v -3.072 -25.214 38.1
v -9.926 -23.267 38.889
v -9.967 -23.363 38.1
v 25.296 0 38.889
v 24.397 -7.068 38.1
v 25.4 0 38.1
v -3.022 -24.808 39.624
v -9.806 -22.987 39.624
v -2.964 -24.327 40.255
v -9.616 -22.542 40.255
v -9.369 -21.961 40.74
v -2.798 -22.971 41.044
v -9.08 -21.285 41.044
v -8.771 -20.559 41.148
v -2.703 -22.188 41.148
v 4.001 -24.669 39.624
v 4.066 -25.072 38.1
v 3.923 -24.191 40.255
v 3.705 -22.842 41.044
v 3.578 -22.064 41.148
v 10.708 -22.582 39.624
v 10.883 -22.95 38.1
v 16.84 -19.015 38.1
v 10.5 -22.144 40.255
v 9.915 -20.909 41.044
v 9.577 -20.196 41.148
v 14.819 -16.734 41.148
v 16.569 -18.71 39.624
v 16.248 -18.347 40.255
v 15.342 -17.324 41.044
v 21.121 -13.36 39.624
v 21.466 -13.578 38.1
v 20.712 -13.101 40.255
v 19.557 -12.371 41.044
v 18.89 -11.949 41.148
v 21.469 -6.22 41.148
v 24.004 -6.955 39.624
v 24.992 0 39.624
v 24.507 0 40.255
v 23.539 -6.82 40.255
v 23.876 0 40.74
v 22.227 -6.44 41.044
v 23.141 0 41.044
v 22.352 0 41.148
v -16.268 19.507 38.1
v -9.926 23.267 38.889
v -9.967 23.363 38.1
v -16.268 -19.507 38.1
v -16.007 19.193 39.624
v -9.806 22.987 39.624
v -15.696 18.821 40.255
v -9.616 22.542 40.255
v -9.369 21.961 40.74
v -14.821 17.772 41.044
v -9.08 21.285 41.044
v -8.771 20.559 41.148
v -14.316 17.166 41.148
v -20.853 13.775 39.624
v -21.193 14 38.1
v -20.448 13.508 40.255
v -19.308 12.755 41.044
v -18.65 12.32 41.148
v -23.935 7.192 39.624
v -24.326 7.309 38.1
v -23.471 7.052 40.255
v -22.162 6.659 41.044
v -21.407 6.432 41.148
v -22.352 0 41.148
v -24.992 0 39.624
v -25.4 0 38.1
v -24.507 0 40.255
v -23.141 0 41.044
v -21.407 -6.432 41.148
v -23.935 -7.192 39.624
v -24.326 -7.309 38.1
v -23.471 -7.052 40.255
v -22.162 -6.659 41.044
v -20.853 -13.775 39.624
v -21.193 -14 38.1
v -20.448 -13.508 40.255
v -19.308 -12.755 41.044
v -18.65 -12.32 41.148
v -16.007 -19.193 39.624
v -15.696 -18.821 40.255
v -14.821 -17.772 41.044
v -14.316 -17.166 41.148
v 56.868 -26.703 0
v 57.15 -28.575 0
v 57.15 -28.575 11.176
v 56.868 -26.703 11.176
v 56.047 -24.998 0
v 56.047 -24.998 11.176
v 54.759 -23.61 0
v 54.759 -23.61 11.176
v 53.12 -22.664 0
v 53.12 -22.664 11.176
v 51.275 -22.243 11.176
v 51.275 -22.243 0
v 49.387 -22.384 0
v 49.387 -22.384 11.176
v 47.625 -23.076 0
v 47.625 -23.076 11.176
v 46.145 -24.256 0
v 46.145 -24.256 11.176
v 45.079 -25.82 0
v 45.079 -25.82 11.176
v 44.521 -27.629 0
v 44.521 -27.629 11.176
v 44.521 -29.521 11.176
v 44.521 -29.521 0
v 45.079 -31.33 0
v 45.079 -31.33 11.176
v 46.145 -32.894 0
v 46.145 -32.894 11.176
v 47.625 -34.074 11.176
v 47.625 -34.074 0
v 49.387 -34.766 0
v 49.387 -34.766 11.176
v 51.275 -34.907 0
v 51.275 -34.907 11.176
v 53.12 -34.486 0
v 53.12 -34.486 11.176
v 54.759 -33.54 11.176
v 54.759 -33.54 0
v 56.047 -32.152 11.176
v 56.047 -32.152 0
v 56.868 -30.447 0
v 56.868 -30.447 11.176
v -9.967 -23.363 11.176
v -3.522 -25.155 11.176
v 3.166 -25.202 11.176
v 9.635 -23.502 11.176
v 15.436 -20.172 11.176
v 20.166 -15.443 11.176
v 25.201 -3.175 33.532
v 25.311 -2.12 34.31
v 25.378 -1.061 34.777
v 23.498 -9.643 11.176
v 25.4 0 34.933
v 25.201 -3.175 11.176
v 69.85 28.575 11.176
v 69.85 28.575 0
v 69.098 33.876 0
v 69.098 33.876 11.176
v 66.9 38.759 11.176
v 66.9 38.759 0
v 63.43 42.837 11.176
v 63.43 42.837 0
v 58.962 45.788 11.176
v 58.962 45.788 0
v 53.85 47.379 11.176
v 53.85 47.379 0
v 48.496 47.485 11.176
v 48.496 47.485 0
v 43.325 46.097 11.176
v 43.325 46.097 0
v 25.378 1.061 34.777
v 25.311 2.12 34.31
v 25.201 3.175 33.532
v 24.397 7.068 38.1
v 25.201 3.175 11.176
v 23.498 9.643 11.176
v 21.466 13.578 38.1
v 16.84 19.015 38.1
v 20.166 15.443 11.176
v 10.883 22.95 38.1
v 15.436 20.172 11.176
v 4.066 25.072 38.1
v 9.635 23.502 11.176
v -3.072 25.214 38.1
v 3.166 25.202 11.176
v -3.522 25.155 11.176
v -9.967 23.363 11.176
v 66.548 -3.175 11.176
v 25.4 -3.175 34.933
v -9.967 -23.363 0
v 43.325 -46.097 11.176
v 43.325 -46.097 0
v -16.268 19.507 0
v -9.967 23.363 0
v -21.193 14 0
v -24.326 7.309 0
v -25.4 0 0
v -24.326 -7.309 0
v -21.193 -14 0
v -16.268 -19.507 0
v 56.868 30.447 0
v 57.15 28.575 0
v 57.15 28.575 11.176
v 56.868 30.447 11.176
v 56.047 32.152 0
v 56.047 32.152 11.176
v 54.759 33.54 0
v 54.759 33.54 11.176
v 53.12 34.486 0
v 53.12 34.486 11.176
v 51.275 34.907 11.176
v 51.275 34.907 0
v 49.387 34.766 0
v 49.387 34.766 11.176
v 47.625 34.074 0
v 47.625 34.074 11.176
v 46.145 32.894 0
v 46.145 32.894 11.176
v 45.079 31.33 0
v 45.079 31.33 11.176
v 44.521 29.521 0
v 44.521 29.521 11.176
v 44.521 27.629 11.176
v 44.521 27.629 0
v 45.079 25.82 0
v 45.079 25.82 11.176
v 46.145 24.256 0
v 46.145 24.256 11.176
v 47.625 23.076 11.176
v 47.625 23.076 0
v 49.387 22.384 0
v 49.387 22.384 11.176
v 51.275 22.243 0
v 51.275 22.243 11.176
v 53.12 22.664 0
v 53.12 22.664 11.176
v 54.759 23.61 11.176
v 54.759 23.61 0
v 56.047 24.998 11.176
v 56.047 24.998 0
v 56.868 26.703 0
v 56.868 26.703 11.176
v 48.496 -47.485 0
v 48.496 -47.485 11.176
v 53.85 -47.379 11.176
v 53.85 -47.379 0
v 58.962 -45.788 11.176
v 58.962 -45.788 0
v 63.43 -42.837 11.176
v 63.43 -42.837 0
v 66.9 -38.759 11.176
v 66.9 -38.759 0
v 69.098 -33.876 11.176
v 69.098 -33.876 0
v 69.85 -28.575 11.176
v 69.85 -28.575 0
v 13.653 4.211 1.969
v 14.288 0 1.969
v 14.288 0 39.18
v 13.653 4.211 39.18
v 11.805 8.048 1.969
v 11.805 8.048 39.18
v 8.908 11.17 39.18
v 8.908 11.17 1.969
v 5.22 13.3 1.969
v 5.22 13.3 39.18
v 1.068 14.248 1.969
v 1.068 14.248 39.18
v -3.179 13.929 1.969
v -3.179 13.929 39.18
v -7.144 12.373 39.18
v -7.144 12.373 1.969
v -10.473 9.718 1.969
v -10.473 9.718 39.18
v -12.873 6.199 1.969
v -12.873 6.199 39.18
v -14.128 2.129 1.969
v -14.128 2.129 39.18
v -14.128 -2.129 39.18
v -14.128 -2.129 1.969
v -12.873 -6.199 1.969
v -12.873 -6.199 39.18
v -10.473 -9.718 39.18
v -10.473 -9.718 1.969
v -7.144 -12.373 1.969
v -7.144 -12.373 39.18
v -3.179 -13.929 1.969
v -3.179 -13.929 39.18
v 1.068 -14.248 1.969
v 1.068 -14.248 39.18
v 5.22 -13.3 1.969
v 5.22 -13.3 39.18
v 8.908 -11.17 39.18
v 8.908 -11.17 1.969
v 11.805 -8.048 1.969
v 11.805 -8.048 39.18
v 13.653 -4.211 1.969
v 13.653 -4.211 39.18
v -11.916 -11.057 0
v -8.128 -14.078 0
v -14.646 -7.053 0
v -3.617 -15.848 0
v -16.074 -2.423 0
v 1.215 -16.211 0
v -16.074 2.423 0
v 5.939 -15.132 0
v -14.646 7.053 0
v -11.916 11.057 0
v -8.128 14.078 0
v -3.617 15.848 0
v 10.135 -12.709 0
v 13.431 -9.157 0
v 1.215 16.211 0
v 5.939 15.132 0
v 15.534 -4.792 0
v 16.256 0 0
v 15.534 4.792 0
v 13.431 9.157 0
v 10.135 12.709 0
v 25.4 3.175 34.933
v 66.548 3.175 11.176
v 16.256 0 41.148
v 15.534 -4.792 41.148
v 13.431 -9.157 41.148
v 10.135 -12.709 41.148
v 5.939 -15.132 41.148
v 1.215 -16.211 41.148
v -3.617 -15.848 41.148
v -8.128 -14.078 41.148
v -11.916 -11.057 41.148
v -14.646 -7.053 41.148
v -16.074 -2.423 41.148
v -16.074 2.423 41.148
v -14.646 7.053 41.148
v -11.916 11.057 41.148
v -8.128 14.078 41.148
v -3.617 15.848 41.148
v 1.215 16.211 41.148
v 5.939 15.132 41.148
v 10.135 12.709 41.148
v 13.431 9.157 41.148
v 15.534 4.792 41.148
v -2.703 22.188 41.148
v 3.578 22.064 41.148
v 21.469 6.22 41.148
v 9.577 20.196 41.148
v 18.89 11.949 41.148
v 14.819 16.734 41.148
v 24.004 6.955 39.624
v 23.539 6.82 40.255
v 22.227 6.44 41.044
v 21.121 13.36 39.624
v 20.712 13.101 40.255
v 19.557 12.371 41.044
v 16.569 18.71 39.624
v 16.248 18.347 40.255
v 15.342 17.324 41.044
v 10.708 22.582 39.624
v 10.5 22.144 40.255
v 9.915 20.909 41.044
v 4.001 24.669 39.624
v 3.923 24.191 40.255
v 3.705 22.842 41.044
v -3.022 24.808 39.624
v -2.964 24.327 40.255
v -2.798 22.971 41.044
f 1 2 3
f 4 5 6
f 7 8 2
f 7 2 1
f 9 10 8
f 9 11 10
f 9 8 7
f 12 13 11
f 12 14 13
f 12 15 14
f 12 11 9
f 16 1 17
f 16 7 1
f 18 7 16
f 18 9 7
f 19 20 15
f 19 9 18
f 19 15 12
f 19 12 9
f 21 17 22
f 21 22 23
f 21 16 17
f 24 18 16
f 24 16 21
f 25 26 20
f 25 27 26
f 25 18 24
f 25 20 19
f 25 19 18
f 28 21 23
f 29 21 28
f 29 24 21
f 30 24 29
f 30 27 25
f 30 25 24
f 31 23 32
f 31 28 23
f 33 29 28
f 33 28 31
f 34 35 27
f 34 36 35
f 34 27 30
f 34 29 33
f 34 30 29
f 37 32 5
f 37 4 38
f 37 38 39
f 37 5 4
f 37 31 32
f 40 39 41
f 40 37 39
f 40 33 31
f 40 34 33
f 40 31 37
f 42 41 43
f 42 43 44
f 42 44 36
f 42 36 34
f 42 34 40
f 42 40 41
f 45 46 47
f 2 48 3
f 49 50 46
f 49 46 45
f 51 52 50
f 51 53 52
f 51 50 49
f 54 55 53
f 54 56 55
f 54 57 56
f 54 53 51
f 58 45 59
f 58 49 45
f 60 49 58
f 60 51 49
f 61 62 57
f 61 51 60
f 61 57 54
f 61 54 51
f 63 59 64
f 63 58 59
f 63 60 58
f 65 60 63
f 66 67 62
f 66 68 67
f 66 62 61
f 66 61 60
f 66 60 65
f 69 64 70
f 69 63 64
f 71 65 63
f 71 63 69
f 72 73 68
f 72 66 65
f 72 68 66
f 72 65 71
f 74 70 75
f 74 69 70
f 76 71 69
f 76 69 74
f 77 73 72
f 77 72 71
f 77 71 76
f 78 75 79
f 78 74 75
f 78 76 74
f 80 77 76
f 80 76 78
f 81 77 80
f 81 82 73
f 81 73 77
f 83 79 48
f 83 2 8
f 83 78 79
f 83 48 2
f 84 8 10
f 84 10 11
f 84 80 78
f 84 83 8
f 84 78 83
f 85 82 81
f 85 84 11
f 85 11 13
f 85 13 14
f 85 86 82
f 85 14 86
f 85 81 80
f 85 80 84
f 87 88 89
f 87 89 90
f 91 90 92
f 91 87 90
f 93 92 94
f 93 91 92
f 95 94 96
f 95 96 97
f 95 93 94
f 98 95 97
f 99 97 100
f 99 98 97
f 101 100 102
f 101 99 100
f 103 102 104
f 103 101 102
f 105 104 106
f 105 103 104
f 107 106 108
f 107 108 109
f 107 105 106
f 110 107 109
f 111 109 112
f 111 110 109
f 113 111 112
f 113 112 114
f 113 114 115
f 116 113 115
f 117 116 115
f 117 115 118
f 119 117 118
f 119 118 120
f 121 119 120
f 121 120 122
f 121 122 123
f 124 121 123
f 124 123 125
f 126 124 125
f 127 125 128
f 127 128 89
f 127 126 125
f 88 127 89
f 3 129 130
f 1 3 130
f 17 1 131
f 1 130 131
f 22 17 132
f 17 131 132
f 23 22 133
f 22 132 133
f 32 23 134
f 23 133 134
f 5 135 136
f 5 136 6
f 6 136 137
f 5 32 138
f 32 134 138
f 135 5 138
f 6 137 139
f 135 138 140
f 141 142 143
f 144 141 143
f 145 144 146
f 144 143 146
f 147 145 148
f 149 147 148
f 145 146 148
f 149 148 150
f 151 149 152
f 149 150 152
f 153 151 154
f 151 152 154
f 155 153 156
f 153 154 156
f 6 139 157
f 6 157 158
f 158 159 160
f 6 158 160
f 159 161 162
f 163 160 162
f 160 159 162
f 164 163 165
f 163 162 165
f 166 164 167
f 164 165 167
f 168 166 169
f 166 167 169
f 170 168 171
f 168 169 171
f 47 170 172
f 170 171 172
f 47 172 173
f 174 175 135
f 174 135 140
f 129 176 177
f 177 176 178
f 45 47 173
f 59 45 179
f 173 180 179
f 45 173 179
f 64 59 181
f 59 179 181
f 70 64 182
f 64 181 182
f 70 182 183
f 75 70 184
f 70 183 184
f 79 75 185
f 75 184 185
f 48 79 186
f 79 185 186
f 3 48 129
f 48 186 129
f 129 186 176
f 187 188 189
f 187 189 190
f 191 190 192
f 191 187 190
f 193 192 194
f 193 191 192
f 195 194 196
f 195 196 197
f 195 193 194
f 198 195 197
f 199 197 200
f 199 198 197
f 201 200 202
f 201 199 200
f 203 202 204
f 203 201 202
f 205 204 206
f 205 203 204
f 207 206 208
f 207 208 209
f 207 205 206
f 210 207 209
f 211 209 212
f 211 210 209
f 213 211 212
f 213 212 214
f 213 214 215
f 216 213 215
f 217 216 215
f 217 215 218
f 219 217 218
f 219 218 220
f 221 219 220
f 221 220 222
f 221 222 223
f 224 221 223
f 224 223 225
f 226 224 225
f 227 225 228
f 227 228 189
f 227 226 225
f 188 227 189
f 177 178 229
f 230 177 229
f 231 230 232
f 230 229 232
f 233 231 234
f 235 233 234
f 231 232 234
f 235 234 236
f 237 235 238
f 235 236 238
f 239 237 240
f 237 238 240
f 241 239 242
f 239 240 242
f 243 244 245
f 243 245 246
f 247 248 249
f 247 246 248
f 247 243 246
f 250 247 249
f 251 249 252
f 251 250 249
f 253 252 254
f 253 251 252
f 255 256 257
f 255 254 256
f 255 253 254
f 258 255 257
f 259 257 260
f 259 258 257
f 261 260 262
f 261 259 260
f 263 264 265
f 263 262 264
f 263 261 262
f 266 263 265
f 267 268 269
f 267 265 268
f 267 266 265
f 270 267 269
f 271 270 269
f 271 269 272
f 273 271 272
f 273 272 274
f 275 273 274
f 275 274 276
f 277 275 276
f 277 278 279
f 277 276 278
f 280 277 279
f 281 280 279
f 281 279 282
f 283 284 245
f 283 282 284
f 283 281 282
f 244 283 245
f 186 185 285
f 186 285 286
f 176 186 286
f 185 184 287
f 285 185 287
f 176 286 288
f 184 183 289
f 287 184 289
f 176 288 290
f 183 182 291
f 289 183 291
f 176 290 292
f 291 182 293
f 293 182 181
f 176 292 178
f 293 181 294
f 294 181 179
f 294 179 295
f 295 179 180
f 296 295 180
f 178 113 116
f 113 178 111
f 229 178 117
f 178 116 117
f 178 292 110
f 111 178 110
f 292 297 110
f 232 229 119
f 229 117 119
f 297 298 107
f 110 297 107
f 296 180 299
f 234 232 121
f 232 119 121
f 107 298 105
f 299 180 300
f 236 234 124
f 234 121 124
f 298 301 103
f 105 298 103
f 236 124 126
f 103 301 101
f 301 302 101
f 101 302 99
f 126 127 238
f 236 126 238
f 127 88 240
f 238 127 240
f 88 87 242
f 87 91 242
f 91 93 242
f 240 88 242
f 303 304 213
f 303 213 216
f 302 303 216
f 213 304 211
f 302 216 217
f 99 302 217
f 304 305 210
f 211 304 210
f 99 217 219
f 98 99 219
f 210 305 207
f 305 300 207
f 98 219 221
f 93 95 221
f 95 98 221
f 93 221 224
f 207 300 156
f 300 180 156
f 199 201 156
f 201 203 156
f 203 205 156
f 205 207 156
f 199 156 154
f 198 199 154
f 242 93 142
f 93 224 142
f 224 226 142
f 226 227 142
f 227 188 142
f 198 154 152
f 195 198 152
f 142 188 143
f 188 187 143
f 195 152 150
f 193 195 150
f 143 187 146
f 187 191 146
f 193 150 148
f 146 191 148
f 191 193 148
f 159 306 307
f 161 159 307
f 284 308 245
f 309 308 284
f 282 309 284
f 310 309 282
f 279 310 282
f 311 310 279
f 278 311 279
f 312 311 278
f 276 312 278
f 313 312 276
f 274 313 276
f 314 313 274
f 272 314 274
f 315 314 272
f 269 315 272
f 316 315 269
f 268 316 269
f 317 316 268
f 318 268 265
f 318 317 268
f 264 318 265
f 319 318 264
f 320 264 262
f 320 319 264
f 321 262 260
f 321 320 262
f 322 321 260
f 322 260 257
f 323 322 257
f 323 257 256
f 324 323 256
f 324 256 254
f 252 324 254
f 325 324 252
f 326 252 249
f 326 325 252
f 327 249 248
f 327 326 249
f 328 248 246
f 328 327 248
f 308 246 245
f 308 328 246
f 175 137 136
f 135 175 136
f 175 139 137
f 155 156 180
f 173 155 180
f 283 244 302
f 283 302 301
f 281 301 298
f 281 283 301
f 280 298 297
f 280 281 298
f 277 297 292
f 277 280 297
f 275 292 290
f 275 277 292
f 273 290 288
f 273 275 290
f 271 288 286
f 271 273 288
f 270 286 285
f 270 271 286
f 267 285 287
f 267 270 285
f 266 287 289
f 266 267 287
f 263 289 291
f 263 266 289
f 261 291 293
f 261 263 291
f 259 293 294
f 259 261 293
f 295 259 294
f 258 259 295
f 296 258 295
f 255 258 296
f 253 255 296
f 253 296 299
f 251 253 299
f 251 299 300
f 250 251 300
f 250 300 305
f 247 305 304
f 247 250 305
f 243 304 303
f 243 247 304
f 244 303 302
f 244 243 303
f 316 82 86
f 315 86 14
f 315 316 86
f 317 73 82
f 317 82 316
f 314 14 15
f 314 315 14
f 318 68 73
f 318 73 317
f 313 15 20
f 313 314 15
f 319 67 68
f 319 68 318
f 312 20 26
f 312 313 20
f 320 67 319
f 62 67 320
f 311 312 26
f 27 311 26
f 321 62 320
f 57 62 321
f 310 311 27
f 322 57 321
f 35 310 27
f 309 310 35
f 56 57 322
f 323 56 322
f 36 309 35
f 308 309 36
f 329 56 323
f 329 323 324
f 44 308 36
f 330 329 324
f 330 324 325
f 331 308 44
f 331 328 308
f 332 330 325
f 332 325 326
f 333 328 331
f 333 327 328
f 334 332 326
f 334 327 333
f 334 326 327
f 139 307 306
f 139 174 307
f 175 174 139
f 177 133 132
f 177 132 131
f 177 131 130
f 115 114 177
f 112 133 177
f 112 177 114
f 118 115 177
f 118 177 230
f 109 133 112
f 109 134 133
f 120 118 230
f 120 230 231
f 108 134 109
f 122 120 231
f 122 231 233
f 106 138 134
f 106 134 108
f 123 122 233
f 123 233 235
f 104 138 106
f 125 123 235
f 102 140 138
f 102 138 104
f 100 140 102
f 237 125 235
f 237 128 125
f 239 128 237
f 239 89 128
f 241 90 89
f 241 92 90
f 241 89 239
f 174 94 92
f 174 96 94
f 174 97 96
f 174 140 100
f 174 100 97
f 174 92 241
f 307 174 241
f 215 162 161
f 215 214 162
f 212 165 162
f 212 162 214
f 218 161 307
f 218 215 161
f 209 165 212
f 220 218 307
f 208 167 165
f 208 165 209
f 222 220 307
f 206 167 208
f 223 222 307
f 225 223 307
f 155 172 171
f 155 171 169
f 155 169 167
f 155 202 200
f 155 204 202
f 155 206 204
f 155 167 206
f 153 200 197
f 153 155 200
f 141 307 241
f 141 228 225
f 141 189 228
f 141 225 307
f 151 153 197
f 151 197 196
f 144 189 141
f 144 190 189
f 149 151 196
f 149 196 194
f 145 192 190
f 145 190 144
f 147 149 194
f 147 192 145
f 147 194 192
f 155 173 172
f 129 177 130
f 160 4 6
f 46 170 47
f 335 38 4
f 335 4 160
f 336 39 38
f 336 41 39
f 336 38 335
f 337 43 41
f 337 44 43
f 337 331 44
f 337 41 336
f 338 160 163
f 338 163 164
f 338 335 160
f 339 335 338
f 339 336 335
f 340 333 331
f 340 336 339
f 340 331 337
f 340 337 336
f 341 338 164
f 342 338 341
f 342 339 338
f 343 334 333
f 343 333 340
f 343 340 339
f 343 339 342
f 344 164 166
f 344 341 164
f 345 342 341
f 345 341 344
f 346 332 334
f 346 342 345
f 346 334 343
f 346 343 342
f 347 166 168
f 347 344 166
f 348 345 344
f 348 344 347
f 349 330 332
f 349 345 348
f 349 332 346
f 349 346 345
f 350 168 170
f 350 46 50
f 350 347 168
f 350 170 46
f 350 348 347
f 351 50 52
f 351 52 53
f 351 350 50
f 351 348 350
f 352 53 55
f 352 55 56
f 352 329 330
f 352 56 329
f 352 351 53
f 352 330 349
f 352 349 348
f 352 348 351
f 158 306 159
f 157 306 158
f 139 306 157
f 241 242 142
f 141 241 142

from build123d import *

# Parameters (mm, degrees)
F0_R     = 14.2875
F1_DEPTH = 41.148
F0_R_2   = 6.35
F2_DEPTH = 11.176
F6_DEPTH = 3.175
F7_R     = 3.048


with BuildPart() as f1:
    # F0 (on Top) → F1 (new body)
    with BuildSketch(Plane.XY):
        with BuildLine():
            ThreePointArc((-9.966643, -23.36292), (14.00013, -21.193309), (25.4, 0))
            ThreePointArc((25.4, 0), (14.00013, 21.193309), (-9.966643, 23.36292))
            ThreePointArc((-9.966643, 23.36292), (-25.4, 0), (-9.966643, -23.36292))
        make_face()
        Circle(F0_R, mode=Mode.SUBTRACT)
    extrude(amount=F1_DEPTH)

    # F0 (on Top) → F2 (join)
    with BuildSketch(Plane.XY):
        with BuildLine():
            ThreePointArc((-9.966643, 23.36292), (14.00013, 21.193309), (25.4, 0))
            ThreePointArc((25.4, 0), (14.00013, -21.193309), (-9.966643, -23.36292))
            Line((-9.966643, -23.36292), (43.325018, -46.09719))
            ThreePointArc((43.325018, -46.09719), (61.300097, -44.469982), (69.85, -28.575))
            Line((69.85, -28.575), (69.85, 28.575))
            ThreePointArc((69.85, 28.575), (61.300097, 44.469982), (43.325018, 46.09719))
            Line((43.325018, 46.09719), (-9.966643, 23.36292))
        make_face()
        with Locations((50.8, -28.575)):
            Circle(F0_R_2, mode=Mode.SUBTRACT)
        with Locations((50.8, 28.575)):
            Circle(F0_R_2, mode=Mode.SUBTRACT)
    extrude(amount=F2_DEPTH)

    # F3 (on Front) → F4 (revolve, cut)
    with BuildSketch(Plane.XZ):
        Polygon((0, 41.148), (0, 0), (14.2875, 0), (16.256, 0), (14.224, 2.032), (14.224, 39.116), (16.256, 41.148), align=None)
    revolve(axis=Axis((0, 0, 20.574), (0, 0, -1)), mode=Mode.SUBTRACT)

    # F5 (on Front) → F6 (join, symmetric)
    with BuildSketch(Plane.XZ):
        Polygon((66.548, 11.176), (25.4, 34.932809), (21.651473, 8.582563), align=None)
    extrude(amount=F6_DEPTH, both=True)

    # F7
    f7_edges = [f1.edges().sort_by_distance(p)[0] for p in [
        (9.966643, -23.36292, 41.148),
    ]]
    fillet(f7_edges, radius=F7_R)


solid = f1.part
